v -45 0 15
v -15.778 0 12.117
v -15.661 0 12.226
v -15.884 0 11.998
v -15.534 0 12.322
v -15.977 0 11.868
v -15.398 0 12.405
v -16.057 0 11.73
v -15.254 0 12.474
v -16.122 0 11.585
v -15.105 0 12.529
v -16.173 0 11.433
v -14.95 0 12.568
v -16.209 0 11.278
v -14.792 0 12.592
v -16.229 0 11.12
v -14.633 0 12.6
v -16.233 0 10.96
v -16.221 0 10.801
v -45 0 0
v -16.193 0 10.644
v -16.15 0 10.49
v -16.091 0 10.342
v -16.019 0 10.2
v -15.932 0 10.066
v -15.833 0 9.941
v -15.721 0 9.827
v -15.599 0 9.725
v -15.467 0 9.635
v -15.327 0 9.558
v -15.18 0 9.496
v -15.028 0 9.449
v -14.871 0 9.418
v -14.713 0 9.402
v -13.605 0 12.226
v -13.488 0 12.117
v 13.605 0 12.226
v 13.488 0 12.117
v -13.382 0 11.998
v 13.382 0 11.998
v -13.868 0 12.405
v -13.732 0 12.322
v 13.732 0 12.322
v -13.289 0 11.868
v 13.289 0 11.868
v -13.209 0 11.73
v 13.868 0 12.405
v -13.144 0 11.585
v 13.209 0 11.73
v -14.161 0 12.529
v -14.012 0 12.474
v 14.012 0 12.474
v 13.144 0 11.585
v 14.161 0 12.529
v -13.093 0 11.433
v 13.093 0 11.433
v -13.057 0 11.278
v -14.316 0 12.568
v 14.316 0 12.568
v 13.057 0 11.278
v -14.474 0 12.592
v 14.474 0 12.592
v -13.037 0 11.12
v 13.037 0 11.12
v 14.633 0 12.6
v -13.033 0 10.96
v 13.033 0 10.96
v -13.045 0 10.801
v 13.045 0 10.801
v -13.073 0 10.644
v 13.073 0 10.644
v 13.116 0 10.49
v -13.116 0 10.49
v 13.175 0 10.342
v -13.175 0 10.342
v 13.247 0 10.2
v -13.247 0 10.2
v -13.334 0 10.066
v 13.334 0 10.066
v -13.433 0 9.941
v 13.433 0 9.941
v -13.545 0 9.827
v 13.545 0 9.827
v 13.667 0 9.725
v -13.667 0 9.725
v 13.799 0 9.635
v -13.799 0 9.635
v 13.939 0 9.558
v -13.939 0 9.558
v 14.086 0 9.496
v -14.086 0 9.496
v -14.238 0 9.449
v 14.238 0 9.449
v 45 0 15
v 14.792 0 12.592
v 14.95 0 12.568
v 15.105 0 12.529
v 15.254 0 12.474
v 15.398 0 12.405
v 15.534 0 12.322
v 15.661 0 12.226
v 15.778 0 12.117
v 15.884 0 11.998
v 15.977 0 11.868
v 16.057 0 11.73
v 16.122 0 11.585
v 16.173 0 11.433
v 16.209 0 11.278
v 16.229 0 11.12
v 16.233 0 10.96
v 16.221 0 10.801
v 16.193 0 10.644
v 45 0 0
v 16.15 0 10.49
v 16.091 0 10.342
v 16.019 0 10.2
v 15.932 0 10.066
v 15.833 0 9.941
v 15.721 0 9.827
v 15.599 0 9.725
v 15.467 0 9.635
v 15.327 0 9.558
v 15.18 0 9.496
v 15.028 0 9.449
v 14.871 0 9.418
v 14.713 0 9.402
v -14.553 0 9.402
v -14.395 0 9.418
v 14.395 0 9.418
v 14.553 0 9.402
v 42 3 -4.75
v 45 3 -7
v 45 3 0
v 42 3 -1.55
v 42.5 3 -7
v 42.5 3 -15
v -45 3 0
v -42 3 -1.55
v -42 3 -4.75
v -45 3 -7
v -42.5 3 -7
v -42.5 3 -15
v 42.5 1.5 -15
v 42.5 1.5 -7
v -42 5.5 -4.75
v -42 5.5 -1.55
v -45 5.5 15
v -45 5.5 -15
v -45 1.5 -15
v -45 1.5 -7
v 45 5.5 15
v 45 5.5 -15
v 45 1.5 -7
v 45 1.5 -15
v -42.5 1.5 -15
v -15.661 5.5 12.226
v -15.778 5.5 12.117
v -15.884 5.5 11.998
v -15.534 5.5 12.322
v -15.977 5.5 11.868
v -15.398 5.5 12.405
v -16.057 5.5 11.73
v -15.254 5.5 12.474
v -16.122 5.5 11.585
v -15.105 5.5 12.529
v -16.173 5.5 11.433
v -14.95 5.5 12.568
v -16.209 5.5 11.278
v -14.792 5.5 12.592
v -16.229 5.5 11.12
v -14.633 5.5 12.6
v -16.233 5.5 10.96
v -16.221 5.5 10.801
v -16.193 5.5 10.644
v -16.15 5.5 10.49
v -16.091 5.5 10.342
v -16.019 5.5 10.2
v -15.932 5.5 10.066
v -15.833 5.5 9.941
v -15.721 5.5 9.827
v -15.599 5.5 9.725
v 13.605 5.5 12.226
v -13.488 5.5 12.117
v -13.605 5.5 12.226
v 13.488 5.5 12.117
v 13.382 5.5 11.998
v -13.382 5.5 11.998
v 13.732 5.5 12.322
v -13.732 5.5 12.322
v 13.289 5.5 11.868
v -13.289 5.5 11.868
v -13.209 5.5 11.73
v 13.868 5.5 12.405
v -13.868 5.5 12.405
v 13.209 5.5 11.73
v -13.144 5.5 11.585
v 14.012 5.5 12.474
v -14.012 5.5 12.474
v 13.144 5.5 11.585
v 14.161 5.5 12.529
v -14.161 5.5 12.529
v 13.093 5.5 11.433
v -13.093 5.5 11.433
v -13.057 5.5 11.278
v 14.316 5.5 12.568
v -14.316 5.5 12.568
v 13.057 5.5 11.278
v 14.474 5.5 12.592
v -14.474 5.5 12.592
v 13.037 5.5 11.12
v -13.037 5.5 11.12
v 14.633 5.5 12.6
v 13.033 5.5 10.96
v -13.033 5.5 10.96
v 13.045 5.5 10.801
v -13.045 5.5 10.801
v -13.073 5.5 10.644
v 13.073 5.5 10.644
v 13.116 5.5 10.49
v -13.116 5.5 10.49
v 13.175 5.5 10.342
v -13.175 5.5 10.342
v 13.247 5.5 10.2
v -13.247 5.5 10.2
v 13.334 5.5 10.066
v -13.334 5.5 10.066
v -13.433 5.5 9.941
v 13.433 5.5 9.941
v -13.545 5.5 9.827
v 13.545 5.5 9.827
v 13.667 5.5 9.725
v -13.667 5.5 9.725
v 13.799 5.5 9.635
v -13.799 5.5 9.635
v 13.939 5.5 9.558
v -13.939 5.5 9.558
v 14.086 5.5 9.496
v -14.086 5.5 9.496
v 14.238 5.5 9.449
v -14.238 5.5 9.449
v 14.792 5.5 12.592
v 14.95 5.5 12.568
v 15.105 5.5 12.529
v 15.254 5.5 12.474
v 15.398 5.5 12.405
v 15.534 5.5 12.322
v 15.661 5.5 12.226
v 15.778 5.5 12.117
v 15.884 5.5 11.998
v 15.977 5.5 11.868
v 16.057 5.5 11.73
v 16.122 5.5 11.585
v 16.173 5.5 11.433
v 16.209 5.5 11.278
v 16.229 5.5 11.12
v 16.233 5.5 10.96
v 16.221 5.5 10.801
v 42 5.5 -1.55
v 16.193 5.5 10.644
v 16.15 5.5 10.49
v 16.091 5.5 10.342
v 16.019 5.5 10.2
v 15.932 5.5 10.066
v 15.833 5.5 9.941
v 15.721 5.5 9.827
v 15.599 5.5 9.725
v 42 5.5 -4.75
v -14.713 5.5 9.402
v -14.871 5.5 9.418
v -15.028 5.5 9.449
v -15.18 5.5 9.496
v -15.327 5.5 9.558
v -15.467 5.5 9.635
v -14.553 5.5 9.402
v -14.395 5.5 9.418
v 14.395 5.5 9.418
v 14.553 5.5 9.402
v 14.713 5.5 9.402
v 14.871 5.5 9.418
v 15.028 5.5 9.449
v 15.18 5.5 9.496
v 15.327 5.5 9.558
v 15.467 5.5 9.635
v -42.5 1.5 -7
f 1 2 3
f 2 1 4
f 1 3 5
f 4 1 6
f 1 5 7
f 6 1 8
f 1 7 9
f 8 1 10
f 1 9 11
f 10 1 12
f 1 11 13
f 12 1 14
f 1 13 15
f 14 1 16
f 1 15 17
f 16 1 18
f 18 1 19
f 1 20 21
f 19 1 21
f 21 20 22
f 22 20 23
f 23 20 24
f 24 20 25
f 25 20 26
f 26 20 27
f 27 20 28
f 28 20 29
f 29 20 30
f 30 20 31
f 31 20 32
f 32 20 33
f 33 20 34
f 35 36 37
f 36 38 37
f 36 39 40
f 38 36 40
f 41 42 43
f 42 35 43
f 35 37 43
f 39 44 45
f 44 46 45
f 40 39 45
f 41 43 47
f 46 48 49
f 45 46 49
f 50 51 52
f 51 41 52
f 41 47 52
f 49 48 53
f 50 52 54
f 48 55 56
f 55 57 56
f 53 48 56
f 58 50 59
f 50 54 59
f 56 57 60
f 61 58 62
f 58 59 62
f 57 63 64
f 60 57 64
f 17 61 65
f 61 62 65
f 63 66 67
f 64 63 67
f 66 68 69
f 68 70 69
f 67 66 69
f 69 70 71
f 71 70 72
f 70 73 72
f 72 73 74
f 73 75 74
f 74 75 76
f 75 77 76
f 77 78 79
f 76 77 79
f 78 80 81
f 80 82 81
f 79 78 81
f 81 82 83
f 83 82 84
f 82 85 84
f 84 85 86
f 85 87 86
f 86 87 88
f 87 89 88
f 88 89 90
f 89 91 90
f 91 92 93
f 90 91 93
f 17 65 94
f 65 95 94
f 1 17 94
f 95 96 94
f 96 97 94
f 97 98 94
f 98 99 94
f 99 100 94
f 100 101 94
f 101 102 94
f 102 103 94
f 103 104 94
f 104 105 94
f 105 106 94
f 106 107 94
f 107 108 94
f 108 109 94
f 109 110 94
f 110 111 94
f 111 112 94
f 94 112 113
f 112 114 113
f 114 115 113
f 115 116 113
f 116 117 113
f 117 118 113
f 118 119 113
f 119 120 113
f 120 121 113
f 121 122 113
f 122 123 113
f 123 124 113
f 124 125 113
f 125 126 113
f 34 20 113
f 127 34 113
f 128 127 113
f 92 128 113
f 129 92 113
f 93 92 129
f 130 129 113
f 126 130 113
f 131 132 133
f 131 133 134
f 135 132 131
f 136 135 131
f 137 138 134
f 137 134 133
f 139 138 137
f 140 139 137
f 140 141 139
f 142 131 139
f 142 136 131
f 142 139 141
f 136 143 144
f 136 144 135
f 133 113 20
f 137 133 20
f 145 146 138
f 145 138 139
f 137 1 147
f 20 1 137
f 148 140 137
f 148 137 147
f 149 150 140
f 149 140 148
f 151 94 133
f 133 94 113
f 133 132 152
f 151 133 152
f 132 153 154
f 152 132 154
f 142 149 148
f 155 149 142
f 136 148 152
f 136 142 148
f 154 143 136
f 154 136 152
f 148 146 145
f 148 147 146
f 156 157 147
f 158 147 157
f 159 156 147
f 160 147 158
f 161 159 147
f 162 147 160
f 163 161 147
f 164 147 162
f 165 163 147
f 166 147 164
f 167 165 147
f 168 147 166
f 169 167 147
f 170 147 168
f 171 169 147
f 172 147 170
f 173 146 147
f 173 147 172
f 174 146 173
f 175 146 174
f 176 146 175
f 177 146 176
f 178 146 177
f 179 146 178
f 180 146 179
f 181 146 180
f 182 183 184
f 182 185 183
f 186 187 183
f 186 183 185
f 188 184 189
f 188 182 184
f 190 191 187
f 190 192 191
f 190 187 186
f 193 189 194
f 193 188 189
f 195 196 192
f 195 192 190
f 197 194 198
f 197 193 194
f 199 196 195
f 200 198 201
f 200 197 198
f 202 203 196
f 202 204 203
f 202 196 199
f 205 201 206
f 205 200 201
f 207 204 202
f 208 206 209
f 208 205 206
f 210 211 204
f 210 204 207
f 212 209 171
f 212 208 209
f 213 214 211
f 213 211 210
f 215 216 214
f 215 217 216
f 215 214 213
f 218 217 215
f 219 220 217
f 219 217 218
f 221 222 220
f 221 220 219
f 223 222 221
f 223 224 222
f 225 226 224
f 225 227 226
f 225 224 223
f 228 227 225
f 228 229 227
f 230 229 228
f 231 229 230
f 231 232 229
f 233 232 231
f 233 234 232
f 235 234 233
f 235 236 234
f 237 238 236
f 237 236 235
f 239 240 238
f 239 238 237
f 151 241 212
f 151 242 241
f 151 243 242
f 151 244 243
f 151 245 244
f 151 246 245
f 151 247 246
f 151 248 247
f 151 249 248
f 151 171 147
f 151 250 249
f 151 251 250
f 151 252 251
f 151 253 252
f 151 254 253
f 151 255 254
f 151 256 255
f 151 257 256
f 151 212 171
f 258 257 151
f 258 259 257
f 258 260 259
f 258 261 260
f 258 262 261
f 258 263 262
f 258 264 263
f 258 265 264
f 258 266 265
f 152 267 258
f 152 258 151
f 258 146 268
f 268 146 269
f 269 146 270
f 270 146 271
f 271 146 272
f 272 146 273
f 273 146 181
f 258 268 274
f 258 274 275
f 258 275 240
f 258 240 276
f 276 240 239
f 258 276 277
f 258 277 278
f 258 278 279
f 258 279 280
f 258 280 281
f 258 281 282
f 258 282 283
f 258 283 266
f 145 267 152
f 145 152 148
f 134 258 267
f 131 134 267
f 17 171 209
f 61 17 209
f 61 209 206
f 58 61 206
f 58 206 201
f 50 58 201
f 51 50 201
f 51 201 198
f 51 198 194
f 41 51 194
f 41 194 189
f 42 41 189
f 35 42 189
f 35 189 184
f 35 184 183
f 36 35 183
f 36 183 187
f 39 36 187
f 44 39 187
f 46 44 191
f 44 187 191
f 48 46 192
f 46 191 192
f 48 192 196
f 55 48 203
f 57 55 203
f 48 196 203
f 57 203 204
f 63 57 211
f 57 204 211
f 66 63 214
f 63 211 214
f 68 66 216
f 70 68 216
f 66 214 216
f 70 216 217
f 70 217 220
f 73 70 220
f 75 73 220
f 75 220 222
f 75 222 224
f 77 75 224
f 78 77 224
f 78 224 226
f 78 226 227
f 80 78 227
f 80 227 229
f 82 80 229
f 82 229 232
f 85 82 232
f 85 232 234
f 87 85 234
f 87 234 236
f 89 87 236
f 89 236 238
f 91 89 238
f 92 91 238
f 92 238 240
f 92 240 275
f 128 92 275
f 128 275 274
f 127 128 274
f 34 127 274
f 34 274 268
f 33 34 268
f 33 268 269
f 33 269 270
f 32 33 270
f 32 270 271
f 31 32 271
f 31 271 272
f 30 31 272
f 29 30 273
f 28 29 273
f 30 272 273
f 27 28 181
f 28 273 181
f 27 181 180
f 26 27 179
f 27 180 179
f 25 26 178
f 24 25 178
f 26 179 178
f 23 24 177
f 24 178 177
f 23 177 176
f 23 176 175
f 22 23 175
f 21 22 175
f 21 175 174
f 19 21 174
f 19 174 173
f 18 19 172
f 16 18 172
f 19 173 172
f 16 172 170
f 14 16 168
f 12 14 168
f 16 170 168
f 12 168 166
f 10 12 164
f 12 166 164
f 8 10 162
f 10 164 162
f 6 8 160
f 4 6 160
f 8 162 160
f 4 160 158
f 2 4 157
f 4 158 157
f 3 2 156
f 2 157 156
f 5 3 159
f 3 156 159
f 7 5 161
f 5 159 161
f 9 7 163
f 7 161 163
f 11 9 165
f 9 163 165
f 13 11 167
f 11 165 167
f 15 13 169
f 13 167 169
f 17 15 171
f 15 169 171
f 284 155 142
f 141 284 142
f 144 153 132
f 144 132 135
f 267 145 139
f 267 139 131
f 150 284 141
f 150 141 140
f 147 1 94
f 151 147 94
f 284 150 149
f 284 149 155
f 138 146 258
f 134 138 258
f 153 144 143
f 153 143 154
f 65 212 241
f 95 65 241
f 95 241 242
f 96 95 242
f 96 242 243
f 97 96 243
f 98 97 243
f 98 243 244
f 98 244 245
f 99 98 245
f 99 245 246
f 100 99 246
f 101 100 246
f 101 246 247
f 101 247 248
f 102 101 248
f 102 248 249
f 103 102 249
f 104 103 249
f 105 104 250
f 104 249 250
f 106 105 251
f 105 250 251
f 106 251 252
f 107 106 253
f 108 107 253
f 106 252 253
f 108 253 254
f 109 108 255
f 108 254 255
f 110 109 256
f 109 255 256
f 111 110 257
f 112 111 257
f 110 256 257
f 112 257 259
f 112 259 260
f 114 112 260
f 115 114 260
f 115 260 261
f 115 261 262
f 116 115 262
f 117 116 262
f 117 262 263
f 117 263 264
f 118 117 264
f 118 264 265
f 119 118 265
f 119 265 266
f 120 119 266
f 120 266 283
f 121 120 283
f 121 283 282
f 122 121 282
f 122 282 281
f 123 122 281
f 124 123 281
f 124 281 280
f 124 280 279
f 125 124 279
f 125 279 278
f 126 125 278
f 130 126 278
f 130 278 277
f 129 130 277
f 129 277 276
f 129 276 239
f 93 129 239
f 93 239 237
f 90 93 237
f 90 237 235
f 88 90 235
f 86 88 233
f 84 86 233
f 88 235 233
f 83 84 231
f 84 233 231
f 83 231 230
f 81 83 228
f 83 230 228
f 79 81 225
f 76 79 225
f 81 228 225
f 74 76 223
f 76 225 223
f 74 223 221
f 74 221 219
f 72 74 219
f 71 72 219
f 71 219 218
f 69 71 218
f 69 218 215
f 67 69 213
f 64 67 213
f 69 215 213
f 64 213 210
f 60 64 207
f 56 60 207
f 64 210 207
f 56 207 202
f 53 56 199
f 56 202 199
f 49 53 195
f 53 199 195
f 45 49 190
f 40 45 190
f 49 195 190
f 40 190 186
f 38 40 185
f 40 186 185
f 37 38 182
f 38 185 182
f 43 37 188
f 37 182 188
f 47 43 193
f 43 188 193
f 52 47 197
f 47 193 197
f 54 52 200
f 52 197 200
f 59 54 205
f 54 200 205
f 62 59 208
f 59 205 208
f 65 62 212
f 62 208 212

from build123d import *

# Parameters (mm, degrees)
SKETCH2_W           = 90
SKETCH2_H           = 30
BOSS_EXTRUDE1_DEPTH = 5.5
SKETCH3_W           = 90
SKETCH3_H           = 3
CUT_EXTRUDE1_DEPTH  = 1.5
SKETCH4_W           = 85
SKETCH4_H           = 1.5
CUT_EXTRUDE2_DEPTH  = 15
SKETCH5_W           = 84
SKETCH5_H           = 3.2
CUT_EXTRUDE3_DEPTH  = 2.5
SKETCH6_R           = 1.6
CUT_EXTRUDE4_DEPTH  = 48.75196331
SKETCH7_W           = 90
SKETCH7_H           = 1.5
CUT_EXTRUDE5_DEPTH  = 5
SKETCH8_W           = 90
SKETCH8_H           = 7
CUT_EXTRUDE6_DEPTH  = 3


with BuildPart() as part:
    # Sketch2 → Boss-Extrude1 (new body)
    with BuildSketch(Plane(origin=(0, 0, 0), x_dir=(1, 0, 0), z_dir=(0, 1, 0))):
        Rectangle(SKETCH2_W, SKETCH2_H)
    extrude(amount=BOSS_EXTRUDE1_DEPTH)

    # Sketch3 → Cut-Extrude1 (cut)
    with BuildSketch(Plane.XZ):
        with Locations((0, -8.5)):
            Rectangle(SKETCH3_W, SKETCH3_H)
    extrude(amount=-CUT_EXTRUDE1_DEPTH, mode=Mode.SUBTRACT)

    # Sketch4 → Cut-Extrude2 (cut)
    with BuildSketch(Plane(origin=(0, 0, -15), x_dir=(-1, 0, 0), z_dir=(0, 0, -1))):
        with Locations((0, 2.25)):
            Rectangle(SKETCH4_W, SKETCH4_H)
    extrude(amount=-CUT_EXTRUDE2_DEPTH, mode=Mode.SUBTRACT)

    # Sketch5 → Cut-Extrude3 (cut)
    with BuildSketch(Plane(origin=(0, 5.5, 0), x_dir=(1, 0, 0), z_dir=(0, 1, 0))):
        with Locations((0, 3.15)):
            Rectangle(SKETCH5_W, SKETCH5_H)
    extrude(amount=-CUT_EXTRUDE3_DEPTH, mode=Mode.SUBTRACT)

    # Sketch6 → Cut-Extrude4 (cut, through all)
    with BuildSketch(Plane(origin=(0, 5.5, 0), x_dir=(1, 0, 0), z_dir=(0, 1, 0))):
        with Locations(Location((-14.633, -11, 0), (0, 0, 270))):
            Circle(SKETCH6_R)
        with Locations(Location((14.633, -11, 0), (0, 0, 270))):
            Circle(SKETCH6_R)
    extrude(amount=-CUT_EXTRUDE4_DEPTH, mode=Mode.SUBTRACT)

    # Sketch7 → Cut-Extrude5 (cut)
    with BuildSketch(Plane(origin=(0, 0, -15), x_dir=(-1, 0, 0), z_dir=(0, 0, -1))):
        with Locations((0, 0.75)):
            Rectangle(SKETCH7_W, SKETCH7_H)
    extrude(amount=-CUT_EXTRUDE5_DEPTH, mode=Mode.SUBTRACT)

    # Sketch8 → Cut-Extrude6 (cut)
    with BuildSketch(Plane(origin=(0, 0, 0), x_dir=(-1, 0, 0), z_dir=(0, -1, 0))):
        with Locations((0, 3.5)):
            Rectangle(SKETCH8_W, SKETCH8_H)
    extrude(amount=-CUT_EXTRUDE6_DEPTH, mode=Mode.SUBTRACT)


solid = part.part
